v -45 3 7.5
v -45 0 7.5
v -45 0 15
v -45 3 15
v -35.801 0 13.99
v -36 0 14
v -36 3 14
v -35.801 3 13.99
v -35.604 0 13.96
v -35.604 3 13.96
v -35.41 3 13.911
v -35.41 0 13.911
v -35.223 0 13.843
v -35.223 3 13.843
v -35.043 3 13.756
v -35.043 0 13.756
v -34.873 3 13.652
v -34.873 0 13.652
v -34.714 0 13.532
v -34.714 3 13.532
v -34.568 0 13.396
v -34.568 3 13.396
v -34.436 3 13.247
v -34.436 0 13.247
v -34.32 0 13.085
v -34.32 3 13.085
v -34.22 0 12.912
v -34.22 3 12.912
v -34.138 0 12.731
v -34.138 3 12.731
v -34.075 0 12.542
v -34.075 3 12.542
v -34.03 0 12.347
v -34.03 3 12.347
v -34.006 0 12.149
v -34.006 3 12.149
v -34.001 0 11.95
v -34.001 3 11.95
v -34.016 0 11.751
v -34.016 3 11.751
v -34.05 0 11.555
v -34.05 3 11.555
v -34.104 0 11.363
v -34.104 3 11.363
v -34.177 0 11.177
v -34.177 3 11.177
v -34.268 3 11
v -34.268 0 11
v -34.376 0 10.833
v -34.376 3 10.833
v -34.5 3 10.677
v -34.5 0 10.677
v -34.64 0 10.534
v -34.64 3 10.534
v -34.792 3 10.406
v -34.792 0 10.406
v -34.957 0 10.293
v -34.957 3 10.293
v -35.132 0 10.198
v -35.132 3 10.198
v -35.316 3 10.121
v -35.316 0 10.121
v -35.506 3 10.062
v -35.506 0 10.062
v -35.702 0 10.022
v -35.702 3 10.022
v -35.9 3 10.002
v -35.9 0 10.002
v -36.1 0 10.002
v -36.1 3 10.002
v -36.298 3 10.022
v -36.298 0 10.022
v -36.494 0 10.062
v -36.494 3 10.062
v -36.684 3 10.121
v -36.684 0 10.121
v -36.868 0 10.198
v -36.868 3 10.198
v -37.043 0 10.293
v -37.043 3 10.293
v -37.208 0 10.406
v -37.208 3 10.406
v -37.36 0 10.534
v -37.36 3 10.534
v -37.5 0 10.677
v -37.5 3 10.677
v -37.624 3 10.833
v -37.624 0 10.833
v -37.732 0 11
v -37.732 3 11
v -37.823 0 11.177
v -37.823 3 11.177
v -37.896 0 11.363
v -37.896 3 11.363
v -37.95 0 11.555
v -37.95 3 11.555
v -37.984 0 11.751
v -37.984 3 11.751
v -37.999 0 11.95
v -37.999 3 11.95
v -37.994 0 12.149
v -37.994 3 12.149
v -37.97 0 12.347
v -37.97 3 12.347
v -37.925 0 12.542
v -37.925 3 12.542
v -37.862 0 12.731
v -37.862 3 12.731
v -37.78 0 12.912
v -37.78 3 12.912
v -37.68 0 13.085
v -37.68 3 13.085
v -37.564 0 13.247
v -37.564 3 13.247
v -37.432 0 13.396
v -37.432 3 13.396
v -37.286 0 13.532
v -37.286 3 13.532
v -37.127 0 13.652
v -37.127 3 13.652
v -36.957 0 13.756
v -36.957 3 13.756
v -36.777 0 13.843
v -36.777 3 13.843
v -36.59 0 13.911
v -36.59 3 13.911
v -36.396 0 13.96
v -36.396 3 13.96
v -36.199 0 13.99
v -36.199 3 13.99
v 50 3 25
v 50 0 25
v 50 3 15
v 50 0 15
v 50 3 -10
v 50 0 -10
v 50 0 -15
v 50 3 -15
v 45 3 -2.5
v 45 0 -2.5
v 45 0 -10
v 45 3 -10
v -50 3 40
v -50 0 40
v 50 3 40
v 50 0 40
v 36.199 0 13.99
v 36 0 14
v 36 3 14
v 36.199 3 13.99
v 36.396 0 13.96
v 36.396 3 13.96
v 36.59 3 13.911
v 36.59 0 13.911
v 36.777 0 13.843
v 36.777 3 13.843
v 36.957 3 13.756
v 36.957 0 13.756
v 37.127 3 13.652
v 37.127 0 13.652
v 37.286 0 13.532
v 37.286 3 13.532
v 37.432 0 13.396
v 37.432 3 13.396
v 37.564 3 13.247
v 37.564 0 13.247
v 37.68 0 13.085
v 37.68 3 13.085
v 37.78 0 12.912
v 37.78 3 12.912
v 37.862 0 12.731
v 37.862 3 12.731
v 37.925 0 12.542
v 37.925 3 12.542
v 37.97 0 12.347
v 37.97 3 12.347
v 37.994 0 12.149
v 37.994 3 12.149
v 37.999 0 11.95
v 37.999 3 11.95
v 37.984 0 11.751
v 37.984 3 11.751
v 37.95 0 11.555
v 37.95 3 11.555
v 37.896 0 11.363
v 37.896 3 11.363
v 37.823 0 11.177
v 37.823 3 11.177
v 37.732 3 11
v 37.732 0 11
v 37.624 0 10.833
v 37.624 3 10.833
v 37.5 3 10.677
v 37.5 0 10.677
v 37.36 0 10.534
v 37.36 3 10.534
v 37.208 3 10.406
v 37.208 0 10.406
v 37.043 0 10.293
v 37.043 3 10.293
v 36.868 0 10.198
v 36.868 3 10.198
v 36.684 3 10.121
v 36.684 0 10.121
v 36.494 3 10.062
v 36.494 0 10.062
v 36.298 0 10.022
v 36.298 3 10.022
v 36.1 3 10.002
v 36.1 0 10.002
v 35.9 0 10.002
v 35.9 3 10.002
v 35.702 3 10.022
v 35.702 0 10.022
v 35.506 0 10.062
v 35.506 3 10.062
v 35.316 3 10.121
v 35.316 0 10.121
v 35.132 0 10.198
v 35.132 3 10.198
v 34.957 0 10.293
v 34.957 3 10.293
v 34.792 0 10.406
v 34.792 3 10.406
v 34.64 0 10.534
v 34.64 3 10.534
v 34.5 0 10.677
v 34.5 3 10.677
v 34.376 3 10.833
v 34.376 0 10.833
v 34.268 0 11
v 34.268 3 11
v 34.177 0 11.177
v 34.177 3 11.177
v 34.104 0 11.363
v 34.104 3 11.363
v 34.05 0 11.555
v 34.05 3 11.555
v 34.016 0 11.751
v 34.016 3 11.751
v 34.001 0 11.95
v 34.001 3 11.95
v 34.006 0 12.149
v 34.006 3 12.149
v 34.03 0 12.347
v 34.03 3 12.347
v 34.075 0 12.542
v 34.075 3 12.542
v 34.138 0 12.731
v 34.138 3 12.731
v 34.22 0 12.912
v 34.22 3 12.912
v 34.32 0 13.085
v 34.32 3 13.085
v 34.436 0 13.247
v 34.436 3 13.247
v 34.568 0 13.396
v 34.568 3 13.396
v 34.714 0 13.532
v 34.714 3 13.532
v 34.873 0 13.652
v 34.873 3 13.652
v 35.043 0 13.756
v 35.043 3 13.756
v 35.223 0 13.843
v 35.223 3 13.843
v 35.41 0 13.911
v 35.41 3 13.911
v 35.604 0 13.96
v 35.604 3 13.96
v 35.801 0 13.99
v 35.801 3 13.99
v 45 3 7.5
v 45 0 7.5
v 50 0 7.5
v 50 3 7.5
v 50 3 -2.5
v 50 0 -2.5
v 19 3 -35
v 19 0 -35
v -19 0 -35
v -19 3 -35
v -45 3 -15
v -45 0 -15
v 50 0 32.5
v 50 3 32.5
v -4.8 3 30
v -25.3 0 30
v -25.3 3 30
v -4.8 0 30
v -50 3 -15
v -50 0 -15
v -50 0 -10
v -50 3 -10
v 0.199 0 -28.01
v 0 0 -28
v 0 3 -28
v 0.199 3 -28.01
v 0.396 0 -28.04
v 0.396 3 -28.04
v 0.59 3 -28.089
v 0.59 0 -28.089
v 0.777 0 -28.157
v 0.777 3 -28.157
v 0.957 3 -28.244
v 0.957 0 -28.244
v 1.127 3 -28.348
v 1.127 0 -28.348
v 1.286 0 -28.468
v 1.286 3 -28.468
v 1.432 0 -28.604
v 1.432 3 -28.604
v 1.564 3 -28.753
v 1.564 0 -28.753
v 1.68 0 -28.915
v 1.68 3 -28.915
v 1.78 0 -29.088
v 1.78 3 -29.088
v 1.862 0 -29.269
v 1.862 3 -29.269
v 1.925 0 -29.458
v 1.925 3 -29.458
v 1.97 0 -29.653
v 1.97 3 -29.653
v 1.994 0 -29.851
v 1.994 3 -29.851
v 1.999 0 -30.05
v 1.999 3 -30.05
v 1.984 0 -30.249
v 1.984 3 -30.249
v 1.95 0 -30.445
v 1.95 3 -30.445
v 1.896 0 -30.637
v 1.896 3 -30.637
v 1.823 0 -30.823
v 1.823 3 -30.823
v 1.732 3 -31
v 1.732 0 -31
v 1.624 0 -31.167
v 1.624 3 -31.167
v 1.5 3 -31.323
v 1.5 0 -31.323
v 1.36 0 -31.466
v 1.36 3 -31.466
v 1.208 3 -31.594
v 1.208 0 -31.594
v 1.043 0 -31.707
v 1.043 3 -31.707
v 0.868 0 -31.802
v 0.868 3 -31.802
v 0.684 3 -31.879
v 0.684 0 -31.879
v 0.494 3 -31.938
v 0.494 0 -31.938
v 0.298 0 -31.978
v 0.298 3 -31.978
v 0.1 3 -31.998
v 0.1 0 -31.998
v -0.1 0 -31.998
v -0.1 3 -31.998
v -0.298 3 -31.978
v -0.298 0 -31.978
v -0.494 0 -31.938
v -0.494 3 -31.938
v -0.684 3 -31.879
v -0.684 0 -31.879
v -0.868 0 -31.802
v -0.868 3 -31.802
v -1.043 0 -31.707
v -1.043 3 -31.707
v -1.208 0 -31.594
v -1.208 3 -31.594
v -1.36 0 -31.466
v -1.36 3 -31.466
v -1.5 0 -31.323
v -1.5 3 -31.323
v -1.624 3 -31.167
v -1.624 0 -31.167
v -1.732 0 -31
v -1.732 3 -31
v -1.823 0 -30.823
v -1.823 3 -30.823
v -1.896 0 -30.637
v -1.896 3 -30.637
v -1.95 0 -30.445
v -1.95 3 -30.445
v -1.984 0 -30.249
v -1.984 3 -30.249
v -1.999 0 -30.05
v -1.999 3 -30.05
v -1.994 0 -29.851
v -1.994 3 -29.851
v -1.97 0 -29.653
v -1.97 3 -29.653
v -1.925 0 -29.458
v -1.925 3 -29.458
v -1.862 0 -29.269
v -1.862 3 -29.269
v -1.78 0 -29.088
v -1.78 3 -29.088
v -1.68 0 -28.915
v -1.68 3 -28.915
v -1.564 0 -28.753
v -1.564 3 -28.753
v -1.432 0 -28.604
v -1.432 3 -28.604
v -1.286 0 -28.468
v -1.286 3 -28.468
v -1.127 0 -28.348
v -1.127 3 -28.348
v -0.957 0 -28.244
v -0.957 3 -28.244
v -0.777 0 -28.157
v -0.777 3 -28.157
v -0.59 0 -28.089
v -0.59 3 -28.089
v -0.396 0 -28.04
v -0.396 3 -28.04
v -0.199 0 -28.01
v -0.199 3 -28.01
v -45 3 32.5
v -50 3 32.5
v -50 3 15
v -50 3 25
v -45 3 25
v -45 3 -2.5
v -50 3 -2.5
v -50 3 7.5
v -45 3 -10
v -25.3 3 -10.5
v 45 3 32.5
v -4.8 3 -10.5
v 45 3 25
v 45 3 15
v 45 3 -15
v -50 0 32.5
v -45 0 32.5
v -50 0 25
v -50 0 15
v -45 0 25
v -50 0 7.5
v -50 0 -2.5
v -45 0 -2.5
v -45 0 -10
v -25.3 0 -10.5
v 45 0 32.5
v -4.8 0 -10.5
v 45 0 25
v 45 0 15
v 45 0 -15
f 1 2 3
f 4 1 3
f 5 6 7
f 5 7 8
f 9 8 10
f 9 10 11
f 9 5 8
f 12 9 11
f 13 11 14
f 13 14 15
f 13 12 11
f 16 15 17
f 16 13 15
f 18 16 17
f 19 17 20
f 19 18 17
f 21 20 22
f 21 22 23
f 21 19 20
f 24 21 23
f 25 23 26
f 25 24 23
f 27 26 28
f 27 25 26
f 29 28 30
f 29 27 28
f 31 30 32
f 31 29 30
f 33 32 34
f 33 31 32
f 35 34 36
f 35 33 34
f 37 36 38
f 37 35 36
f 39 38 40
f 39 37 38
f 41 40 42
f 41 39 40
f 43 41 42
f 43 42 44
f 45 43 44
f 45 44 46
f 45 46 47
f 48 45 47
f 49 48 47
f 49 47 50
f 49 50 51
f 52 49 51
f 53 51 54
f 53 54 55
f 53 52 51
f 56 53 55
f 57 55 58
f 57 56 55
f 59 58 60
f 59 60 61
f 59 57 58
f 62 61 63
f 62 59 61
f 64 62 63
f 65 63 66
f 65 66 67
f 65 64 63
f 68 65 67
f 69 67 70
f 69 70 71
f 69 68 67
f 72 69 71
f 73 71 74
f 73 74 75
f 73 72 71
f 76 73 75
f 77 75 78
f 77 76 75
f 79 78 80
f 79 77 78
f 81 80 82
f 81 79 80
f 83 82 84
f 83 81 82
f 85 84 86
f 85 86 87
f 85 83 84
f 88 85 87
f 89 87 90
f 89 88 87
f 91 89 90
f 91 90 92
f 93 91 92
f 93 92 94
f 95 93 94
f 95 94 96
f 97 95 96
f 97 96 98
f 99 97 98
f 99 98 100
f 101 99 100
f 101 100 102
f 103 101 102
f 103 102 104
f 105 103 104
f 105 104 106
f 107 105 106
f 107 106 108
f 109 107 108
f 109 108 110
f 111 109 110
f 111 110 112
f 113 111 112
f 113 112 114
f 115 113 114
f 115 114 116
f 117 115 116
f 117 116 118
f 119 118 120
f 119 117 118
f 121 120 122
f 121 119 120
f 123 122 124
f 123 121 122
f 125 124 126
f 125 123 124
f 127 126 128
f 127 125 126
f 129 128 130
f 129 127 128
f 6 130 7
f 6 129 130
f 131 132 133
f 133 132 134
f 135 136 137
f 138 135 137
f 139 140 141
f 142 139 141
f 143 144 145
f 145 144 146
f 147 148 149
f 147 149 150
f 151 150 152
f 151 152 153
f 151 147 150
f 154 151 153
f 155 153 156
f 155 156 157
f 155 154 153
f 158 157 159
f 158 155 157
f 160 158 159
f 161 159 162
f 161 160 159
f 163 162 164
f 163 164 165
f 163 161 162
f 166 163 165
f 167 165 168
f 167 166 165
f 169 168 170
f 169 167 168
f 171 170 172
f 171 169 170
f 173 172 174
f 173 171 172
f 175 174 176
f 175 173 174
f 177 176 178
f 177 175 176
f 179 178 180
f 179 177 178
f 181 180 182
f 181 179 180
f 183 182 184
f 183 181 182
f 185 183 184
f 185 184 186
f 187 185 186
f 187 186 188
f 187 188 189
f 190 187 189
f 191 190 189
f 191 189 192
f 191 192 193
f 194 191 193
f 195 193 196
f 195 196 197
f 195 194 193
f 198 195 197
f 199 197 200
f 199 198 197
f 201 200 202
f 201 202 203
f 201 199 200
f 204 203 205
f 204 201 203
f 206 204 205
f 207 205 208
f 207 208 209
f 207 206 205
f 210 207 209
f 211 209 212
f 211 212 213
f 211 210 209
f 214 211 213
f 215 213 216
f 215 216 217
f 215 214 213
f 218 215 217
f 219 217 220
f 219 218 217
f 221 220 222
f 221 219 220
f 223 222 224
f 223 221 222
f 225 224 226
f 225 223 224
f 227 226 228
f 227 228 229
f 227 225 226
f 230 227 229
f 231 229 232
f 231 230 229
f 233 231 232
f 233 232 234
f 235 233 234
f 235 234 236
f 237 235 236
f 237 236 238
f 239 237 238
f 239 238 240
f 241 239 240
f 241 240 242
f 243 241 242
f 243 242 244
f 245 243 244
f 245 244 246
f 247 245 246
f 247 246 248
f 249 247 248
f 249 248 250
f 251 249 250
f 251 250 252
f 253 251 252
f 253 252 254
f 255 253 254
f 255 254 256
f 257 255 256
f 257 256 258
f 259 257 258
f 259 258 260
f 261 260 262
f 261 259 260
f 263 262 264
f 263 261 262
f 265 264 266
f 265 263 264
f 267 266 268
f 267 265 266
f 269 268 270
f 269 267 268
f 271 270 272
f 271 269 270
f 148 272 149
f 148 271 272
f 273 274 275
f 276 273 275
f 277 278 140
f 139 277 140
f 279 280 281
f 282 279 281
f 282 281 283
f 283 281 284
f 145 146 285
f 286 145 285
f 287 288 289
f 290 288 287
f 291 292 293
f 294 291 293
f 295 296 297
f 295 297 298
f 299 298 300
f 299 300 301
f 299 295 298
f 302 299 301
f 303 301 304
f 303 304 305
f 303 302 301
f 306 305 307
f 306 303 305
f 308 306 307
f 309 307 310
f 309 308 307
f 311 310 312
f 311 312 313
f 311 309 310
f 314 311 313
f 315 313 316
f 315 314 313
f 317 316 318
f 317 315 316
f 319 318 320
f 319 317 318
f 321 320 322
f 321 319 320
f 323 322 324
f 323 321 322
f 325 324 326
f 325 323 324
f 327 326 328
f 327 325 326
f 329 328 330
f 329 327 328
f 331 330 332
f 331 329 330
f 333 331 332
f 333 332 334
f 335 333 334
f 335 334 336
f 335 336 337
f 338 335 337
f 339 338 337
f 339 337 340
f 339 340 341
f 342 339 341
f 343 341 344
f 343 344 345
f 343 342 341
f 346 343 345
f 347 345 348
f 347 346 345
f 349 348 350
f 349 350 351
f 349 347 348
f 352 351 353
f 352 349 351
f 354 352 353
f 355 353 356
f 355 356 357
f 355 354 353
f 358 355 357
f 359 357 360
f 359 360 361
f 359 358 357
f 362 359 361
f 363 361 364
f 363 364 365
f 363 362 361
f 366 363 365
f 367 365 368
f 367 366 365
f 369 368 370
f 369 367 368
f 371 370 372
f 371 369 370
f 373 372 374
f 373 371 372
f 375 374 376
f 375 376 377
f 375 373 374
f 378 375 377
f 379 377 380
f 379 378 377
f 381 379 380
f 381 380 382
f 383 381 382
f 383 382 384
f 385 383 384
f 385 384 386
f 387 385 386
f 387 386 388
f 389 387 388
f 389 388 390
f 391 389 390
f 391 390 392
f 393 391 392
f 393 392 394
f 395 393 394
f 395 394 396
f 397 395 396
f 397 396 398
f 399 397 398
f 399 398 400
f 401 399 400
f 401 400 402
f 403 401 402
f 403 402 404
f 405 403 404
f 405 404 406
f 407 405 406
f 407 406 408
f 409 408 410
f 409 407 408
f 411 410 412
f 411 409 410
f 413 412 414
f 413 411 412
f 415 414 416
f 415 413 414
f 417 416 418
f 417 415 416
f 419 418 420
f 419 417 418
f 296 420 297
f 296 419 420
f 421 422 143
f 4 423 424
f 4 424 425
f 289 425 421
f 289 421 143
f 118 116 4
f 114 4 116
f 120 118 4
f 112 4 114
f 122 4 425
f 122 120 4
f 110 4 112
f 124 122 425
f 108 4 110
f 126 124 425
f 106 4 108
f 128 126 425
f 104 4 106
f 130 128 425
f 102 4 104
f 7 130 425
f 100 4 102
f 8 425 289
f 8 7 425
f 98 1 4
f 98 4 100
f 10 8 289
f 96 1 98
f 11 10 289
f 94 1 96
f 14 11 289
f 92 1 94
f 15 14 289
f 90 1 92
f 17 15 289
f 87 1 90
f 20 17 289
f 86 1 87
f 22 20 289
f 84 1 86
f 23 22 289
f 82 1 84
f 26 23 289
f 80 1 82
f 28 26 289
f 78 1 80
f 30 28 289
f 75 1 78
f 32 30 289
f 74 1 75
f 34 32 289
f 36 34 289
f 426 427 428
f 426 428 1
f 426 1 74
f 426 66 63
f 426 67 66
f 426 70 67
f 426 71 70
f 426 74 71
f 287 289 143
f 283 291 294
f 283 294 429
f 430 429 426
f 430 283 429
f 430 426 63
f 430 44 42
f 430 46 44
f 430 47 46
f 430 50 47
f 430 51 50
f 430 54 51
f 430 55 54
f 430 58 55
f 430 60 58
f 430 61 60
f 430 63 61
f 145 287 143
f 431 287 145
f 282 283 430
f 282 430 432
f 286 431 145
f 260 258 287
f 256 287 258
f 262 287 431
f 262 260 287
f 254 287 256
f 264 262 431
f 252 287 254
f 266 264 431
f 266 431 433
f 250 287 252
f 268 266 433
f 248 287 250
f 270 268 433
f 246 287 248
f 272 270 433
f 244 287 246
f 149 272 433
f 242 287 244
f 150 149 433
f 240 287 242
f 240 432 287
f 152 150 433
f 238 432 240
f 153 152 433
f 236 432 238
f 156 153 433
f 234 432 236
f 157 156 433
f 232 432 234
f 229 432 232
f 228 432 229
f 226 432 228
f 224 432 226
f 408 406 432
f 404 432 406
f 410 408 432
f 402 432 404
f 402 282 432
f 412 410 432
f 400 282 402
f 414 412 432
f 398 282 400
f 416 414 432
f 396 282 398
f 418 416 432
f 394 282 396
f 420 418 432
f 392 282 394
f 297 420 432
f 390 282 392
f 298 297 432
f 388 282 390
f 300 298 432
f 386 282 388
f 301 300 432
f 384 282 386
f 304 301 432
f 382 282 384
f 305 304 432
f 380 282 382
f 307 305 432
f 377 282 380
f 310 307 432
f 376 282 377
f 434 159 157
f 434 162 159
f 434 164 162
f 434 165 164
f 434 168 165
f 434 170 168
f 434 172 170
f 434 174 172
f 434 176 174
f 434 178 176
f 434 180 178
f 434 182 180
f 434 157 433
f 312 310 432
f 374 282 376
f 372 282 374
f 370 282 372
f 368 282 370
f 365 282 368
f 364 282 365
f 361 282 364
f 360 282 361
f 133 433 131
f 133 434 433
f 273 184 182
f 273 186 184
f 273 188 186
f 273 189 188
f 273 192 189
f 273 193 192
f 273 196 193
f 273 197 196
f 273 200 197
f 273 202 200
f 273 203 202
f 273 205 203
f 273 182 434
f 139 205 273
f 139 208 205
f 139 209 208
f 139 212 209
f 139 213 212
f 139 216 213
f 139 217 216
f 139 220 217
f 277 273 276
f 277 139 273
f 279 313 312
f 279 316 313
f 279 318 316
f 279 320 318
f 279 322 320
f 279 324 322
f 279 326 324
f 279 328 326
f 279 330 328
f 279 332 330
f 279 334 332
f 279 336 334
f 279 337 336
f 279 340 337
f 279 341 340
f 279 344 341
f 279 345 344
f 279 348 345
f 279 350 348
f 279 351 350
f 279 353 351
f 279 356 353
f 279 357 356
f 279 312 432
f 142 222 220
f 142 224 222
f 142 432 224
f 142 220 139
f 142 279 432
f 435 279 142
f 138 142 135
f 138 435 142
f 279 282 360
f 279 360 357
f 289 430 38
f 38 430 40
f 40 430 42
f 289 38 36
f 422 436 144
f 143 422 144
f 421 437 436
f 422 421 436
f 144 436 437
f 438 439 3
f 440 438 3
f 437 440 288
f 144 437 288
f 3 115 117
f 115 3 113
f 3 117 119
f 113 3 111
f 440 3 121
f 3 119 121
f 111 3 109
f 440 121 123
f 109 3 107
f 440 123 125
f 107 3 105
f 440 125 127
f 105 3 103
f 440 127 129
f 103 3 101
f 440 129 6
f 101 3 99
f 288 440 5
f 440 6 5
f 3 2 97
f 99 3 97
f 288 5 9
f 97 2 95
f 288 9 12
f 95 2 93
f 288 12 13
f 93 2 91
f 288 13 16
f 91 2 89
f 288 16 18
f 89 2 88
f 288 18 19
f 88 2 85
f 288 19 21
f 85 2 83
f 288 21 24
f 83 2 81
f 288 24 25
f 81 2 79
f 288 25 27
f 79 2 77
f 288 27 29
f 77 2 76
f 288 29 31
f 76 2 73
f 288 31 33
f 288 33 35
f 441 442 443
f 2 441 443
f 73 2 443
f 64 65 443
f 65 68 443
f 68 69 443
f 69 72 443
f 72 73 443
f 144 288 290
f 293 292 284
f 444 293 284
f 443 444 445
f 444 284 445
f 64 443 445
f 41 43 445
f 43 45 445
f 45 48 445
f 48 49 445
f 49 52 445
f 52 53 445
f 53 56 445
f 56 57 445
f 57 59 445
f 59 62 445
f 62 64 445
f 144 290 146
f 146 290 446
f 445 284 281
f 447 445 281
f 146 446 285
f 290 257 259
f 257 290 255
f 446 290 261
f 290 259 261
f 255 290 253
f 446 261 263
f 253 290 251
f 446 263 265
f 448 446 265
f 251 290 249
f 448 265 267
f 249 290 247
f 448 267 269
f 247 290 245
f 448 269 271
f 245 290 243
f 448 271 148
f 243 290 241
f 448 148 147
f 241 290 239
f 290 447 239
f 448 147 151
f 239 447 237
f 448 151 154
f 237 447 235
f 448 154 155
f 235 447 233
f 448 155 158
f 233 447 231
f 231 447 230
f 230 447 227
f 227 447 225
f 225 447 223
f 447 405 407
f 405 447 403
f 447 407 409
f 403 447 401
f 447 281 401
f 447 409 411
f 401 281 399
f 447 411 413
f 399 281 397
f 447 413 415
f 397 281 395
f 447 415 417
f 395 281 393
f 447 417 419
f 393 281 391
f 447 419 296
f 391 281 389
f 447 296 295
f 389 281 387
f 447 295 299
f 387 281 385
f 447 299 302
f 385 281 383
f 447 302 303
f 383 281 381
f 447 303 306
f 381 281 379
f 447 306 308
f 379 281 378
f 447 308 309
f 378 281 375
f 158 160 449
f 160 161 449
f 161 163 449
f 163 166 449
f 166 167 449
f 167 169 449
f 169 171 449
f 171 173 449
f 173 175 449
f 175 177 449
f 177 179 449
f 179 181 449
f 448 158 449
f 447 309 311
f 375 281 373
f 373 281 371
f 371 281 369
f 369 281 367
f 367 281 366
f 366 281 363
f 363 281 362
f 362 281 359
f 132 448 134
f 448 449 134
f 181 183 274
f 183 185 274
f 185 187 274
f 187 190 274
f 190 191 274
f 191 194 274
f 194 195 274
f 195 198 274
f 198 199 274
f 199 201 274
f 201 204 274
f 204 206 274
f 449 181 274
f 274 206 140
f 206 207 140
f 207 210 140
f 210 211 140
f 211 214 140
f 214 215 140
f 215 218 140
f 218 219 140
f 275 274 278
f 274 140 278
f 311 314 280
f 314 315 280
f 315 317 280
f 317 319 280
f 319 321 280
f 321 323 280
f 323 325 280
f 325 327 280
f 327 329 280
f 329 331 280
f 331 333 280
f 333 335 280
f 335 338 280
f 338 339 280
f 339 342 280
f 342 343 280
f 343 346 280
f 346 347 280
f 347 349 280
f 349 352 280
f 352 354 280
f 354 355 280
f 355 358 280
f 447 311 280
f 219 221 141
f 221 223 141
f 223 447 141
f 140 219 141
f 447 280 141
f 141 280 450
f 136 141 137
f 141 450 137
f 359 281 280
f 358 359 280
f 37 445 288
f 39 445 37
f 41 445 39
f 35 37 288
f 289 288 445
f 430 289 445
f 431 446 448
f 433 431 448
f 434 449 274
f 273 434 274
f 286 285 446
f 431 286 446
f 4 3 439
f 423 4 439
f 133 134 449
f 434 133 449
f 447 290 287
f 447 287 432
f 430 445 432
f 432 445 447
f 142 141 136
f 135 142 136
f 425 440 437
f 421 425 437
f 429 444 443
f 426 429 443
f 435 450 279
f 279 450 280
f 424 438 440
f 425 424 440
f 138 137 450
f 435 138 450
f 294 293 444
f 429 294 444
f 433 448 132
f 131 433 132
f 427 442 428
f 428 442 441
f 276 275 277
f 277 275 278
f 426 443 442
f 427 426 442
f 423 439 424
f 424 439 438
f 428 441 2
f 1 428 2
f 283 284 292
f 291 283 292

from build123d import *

# Parameters (mm, degrees)
SKETCH1_R           = 2
SKETCH1_W           = 20.5
SKETCH1_H           = 40.5
BOSS_EXTRUDE1_DEPTH = 3


with BuildPart() as part:
    # Sketch1 → Boss-Extrude1 (new body)
    with BuildSketch(Plane(origin=(0, 0, 0), x_dir=(1, 0, 0), z_dir=(0, 1, 0))):
        Polygon((-45, 10), (-45, 2.5), (-50, 2.5), (-50, -7.5), (-45, -7.5), (-45, -15), (-50, -15), (-50, -25), (-45, -25), (-45, -32.5), (-50, -32.5), (-50, -40), (50, -40), (50, -32.5), (45, -32.5), (45, -25), (50, -25), (50, -15), (45, -15), (45, -7.5), (50, -7.5), (50, 2.5), (45, 2.5), (45, 10), (50, 10), (50, 15), (45, 15), (19, 35), (-19, 35), (-45, 15), (-50, 15), (-50, 10), align=None)
        with Locations(Location((0, 30, 0), (0, 0, 270))):
            Circle(SKETCH1_R, mode=Mode.SUBTRACT)
        with Locations(Location((-36, -12, 0), (0, 0, 270))):
            Circle(SKETCH1_R, mode=Mode.SUBTRACT)
        with Locations(Location((36, -12, 0), (0, 0, 270))):
            Circle(SKETCH1_R, mode=Mode.SUBTRACT)
        with Locations((-15.05, -9.75)):
            Rectangle(SKETCH1_W, SKETCH1_H, mode=Mode.SUBTRACT)
    extrude(amount=BOSS_EXTRUDE1_DEPTH)


solid = part.part
